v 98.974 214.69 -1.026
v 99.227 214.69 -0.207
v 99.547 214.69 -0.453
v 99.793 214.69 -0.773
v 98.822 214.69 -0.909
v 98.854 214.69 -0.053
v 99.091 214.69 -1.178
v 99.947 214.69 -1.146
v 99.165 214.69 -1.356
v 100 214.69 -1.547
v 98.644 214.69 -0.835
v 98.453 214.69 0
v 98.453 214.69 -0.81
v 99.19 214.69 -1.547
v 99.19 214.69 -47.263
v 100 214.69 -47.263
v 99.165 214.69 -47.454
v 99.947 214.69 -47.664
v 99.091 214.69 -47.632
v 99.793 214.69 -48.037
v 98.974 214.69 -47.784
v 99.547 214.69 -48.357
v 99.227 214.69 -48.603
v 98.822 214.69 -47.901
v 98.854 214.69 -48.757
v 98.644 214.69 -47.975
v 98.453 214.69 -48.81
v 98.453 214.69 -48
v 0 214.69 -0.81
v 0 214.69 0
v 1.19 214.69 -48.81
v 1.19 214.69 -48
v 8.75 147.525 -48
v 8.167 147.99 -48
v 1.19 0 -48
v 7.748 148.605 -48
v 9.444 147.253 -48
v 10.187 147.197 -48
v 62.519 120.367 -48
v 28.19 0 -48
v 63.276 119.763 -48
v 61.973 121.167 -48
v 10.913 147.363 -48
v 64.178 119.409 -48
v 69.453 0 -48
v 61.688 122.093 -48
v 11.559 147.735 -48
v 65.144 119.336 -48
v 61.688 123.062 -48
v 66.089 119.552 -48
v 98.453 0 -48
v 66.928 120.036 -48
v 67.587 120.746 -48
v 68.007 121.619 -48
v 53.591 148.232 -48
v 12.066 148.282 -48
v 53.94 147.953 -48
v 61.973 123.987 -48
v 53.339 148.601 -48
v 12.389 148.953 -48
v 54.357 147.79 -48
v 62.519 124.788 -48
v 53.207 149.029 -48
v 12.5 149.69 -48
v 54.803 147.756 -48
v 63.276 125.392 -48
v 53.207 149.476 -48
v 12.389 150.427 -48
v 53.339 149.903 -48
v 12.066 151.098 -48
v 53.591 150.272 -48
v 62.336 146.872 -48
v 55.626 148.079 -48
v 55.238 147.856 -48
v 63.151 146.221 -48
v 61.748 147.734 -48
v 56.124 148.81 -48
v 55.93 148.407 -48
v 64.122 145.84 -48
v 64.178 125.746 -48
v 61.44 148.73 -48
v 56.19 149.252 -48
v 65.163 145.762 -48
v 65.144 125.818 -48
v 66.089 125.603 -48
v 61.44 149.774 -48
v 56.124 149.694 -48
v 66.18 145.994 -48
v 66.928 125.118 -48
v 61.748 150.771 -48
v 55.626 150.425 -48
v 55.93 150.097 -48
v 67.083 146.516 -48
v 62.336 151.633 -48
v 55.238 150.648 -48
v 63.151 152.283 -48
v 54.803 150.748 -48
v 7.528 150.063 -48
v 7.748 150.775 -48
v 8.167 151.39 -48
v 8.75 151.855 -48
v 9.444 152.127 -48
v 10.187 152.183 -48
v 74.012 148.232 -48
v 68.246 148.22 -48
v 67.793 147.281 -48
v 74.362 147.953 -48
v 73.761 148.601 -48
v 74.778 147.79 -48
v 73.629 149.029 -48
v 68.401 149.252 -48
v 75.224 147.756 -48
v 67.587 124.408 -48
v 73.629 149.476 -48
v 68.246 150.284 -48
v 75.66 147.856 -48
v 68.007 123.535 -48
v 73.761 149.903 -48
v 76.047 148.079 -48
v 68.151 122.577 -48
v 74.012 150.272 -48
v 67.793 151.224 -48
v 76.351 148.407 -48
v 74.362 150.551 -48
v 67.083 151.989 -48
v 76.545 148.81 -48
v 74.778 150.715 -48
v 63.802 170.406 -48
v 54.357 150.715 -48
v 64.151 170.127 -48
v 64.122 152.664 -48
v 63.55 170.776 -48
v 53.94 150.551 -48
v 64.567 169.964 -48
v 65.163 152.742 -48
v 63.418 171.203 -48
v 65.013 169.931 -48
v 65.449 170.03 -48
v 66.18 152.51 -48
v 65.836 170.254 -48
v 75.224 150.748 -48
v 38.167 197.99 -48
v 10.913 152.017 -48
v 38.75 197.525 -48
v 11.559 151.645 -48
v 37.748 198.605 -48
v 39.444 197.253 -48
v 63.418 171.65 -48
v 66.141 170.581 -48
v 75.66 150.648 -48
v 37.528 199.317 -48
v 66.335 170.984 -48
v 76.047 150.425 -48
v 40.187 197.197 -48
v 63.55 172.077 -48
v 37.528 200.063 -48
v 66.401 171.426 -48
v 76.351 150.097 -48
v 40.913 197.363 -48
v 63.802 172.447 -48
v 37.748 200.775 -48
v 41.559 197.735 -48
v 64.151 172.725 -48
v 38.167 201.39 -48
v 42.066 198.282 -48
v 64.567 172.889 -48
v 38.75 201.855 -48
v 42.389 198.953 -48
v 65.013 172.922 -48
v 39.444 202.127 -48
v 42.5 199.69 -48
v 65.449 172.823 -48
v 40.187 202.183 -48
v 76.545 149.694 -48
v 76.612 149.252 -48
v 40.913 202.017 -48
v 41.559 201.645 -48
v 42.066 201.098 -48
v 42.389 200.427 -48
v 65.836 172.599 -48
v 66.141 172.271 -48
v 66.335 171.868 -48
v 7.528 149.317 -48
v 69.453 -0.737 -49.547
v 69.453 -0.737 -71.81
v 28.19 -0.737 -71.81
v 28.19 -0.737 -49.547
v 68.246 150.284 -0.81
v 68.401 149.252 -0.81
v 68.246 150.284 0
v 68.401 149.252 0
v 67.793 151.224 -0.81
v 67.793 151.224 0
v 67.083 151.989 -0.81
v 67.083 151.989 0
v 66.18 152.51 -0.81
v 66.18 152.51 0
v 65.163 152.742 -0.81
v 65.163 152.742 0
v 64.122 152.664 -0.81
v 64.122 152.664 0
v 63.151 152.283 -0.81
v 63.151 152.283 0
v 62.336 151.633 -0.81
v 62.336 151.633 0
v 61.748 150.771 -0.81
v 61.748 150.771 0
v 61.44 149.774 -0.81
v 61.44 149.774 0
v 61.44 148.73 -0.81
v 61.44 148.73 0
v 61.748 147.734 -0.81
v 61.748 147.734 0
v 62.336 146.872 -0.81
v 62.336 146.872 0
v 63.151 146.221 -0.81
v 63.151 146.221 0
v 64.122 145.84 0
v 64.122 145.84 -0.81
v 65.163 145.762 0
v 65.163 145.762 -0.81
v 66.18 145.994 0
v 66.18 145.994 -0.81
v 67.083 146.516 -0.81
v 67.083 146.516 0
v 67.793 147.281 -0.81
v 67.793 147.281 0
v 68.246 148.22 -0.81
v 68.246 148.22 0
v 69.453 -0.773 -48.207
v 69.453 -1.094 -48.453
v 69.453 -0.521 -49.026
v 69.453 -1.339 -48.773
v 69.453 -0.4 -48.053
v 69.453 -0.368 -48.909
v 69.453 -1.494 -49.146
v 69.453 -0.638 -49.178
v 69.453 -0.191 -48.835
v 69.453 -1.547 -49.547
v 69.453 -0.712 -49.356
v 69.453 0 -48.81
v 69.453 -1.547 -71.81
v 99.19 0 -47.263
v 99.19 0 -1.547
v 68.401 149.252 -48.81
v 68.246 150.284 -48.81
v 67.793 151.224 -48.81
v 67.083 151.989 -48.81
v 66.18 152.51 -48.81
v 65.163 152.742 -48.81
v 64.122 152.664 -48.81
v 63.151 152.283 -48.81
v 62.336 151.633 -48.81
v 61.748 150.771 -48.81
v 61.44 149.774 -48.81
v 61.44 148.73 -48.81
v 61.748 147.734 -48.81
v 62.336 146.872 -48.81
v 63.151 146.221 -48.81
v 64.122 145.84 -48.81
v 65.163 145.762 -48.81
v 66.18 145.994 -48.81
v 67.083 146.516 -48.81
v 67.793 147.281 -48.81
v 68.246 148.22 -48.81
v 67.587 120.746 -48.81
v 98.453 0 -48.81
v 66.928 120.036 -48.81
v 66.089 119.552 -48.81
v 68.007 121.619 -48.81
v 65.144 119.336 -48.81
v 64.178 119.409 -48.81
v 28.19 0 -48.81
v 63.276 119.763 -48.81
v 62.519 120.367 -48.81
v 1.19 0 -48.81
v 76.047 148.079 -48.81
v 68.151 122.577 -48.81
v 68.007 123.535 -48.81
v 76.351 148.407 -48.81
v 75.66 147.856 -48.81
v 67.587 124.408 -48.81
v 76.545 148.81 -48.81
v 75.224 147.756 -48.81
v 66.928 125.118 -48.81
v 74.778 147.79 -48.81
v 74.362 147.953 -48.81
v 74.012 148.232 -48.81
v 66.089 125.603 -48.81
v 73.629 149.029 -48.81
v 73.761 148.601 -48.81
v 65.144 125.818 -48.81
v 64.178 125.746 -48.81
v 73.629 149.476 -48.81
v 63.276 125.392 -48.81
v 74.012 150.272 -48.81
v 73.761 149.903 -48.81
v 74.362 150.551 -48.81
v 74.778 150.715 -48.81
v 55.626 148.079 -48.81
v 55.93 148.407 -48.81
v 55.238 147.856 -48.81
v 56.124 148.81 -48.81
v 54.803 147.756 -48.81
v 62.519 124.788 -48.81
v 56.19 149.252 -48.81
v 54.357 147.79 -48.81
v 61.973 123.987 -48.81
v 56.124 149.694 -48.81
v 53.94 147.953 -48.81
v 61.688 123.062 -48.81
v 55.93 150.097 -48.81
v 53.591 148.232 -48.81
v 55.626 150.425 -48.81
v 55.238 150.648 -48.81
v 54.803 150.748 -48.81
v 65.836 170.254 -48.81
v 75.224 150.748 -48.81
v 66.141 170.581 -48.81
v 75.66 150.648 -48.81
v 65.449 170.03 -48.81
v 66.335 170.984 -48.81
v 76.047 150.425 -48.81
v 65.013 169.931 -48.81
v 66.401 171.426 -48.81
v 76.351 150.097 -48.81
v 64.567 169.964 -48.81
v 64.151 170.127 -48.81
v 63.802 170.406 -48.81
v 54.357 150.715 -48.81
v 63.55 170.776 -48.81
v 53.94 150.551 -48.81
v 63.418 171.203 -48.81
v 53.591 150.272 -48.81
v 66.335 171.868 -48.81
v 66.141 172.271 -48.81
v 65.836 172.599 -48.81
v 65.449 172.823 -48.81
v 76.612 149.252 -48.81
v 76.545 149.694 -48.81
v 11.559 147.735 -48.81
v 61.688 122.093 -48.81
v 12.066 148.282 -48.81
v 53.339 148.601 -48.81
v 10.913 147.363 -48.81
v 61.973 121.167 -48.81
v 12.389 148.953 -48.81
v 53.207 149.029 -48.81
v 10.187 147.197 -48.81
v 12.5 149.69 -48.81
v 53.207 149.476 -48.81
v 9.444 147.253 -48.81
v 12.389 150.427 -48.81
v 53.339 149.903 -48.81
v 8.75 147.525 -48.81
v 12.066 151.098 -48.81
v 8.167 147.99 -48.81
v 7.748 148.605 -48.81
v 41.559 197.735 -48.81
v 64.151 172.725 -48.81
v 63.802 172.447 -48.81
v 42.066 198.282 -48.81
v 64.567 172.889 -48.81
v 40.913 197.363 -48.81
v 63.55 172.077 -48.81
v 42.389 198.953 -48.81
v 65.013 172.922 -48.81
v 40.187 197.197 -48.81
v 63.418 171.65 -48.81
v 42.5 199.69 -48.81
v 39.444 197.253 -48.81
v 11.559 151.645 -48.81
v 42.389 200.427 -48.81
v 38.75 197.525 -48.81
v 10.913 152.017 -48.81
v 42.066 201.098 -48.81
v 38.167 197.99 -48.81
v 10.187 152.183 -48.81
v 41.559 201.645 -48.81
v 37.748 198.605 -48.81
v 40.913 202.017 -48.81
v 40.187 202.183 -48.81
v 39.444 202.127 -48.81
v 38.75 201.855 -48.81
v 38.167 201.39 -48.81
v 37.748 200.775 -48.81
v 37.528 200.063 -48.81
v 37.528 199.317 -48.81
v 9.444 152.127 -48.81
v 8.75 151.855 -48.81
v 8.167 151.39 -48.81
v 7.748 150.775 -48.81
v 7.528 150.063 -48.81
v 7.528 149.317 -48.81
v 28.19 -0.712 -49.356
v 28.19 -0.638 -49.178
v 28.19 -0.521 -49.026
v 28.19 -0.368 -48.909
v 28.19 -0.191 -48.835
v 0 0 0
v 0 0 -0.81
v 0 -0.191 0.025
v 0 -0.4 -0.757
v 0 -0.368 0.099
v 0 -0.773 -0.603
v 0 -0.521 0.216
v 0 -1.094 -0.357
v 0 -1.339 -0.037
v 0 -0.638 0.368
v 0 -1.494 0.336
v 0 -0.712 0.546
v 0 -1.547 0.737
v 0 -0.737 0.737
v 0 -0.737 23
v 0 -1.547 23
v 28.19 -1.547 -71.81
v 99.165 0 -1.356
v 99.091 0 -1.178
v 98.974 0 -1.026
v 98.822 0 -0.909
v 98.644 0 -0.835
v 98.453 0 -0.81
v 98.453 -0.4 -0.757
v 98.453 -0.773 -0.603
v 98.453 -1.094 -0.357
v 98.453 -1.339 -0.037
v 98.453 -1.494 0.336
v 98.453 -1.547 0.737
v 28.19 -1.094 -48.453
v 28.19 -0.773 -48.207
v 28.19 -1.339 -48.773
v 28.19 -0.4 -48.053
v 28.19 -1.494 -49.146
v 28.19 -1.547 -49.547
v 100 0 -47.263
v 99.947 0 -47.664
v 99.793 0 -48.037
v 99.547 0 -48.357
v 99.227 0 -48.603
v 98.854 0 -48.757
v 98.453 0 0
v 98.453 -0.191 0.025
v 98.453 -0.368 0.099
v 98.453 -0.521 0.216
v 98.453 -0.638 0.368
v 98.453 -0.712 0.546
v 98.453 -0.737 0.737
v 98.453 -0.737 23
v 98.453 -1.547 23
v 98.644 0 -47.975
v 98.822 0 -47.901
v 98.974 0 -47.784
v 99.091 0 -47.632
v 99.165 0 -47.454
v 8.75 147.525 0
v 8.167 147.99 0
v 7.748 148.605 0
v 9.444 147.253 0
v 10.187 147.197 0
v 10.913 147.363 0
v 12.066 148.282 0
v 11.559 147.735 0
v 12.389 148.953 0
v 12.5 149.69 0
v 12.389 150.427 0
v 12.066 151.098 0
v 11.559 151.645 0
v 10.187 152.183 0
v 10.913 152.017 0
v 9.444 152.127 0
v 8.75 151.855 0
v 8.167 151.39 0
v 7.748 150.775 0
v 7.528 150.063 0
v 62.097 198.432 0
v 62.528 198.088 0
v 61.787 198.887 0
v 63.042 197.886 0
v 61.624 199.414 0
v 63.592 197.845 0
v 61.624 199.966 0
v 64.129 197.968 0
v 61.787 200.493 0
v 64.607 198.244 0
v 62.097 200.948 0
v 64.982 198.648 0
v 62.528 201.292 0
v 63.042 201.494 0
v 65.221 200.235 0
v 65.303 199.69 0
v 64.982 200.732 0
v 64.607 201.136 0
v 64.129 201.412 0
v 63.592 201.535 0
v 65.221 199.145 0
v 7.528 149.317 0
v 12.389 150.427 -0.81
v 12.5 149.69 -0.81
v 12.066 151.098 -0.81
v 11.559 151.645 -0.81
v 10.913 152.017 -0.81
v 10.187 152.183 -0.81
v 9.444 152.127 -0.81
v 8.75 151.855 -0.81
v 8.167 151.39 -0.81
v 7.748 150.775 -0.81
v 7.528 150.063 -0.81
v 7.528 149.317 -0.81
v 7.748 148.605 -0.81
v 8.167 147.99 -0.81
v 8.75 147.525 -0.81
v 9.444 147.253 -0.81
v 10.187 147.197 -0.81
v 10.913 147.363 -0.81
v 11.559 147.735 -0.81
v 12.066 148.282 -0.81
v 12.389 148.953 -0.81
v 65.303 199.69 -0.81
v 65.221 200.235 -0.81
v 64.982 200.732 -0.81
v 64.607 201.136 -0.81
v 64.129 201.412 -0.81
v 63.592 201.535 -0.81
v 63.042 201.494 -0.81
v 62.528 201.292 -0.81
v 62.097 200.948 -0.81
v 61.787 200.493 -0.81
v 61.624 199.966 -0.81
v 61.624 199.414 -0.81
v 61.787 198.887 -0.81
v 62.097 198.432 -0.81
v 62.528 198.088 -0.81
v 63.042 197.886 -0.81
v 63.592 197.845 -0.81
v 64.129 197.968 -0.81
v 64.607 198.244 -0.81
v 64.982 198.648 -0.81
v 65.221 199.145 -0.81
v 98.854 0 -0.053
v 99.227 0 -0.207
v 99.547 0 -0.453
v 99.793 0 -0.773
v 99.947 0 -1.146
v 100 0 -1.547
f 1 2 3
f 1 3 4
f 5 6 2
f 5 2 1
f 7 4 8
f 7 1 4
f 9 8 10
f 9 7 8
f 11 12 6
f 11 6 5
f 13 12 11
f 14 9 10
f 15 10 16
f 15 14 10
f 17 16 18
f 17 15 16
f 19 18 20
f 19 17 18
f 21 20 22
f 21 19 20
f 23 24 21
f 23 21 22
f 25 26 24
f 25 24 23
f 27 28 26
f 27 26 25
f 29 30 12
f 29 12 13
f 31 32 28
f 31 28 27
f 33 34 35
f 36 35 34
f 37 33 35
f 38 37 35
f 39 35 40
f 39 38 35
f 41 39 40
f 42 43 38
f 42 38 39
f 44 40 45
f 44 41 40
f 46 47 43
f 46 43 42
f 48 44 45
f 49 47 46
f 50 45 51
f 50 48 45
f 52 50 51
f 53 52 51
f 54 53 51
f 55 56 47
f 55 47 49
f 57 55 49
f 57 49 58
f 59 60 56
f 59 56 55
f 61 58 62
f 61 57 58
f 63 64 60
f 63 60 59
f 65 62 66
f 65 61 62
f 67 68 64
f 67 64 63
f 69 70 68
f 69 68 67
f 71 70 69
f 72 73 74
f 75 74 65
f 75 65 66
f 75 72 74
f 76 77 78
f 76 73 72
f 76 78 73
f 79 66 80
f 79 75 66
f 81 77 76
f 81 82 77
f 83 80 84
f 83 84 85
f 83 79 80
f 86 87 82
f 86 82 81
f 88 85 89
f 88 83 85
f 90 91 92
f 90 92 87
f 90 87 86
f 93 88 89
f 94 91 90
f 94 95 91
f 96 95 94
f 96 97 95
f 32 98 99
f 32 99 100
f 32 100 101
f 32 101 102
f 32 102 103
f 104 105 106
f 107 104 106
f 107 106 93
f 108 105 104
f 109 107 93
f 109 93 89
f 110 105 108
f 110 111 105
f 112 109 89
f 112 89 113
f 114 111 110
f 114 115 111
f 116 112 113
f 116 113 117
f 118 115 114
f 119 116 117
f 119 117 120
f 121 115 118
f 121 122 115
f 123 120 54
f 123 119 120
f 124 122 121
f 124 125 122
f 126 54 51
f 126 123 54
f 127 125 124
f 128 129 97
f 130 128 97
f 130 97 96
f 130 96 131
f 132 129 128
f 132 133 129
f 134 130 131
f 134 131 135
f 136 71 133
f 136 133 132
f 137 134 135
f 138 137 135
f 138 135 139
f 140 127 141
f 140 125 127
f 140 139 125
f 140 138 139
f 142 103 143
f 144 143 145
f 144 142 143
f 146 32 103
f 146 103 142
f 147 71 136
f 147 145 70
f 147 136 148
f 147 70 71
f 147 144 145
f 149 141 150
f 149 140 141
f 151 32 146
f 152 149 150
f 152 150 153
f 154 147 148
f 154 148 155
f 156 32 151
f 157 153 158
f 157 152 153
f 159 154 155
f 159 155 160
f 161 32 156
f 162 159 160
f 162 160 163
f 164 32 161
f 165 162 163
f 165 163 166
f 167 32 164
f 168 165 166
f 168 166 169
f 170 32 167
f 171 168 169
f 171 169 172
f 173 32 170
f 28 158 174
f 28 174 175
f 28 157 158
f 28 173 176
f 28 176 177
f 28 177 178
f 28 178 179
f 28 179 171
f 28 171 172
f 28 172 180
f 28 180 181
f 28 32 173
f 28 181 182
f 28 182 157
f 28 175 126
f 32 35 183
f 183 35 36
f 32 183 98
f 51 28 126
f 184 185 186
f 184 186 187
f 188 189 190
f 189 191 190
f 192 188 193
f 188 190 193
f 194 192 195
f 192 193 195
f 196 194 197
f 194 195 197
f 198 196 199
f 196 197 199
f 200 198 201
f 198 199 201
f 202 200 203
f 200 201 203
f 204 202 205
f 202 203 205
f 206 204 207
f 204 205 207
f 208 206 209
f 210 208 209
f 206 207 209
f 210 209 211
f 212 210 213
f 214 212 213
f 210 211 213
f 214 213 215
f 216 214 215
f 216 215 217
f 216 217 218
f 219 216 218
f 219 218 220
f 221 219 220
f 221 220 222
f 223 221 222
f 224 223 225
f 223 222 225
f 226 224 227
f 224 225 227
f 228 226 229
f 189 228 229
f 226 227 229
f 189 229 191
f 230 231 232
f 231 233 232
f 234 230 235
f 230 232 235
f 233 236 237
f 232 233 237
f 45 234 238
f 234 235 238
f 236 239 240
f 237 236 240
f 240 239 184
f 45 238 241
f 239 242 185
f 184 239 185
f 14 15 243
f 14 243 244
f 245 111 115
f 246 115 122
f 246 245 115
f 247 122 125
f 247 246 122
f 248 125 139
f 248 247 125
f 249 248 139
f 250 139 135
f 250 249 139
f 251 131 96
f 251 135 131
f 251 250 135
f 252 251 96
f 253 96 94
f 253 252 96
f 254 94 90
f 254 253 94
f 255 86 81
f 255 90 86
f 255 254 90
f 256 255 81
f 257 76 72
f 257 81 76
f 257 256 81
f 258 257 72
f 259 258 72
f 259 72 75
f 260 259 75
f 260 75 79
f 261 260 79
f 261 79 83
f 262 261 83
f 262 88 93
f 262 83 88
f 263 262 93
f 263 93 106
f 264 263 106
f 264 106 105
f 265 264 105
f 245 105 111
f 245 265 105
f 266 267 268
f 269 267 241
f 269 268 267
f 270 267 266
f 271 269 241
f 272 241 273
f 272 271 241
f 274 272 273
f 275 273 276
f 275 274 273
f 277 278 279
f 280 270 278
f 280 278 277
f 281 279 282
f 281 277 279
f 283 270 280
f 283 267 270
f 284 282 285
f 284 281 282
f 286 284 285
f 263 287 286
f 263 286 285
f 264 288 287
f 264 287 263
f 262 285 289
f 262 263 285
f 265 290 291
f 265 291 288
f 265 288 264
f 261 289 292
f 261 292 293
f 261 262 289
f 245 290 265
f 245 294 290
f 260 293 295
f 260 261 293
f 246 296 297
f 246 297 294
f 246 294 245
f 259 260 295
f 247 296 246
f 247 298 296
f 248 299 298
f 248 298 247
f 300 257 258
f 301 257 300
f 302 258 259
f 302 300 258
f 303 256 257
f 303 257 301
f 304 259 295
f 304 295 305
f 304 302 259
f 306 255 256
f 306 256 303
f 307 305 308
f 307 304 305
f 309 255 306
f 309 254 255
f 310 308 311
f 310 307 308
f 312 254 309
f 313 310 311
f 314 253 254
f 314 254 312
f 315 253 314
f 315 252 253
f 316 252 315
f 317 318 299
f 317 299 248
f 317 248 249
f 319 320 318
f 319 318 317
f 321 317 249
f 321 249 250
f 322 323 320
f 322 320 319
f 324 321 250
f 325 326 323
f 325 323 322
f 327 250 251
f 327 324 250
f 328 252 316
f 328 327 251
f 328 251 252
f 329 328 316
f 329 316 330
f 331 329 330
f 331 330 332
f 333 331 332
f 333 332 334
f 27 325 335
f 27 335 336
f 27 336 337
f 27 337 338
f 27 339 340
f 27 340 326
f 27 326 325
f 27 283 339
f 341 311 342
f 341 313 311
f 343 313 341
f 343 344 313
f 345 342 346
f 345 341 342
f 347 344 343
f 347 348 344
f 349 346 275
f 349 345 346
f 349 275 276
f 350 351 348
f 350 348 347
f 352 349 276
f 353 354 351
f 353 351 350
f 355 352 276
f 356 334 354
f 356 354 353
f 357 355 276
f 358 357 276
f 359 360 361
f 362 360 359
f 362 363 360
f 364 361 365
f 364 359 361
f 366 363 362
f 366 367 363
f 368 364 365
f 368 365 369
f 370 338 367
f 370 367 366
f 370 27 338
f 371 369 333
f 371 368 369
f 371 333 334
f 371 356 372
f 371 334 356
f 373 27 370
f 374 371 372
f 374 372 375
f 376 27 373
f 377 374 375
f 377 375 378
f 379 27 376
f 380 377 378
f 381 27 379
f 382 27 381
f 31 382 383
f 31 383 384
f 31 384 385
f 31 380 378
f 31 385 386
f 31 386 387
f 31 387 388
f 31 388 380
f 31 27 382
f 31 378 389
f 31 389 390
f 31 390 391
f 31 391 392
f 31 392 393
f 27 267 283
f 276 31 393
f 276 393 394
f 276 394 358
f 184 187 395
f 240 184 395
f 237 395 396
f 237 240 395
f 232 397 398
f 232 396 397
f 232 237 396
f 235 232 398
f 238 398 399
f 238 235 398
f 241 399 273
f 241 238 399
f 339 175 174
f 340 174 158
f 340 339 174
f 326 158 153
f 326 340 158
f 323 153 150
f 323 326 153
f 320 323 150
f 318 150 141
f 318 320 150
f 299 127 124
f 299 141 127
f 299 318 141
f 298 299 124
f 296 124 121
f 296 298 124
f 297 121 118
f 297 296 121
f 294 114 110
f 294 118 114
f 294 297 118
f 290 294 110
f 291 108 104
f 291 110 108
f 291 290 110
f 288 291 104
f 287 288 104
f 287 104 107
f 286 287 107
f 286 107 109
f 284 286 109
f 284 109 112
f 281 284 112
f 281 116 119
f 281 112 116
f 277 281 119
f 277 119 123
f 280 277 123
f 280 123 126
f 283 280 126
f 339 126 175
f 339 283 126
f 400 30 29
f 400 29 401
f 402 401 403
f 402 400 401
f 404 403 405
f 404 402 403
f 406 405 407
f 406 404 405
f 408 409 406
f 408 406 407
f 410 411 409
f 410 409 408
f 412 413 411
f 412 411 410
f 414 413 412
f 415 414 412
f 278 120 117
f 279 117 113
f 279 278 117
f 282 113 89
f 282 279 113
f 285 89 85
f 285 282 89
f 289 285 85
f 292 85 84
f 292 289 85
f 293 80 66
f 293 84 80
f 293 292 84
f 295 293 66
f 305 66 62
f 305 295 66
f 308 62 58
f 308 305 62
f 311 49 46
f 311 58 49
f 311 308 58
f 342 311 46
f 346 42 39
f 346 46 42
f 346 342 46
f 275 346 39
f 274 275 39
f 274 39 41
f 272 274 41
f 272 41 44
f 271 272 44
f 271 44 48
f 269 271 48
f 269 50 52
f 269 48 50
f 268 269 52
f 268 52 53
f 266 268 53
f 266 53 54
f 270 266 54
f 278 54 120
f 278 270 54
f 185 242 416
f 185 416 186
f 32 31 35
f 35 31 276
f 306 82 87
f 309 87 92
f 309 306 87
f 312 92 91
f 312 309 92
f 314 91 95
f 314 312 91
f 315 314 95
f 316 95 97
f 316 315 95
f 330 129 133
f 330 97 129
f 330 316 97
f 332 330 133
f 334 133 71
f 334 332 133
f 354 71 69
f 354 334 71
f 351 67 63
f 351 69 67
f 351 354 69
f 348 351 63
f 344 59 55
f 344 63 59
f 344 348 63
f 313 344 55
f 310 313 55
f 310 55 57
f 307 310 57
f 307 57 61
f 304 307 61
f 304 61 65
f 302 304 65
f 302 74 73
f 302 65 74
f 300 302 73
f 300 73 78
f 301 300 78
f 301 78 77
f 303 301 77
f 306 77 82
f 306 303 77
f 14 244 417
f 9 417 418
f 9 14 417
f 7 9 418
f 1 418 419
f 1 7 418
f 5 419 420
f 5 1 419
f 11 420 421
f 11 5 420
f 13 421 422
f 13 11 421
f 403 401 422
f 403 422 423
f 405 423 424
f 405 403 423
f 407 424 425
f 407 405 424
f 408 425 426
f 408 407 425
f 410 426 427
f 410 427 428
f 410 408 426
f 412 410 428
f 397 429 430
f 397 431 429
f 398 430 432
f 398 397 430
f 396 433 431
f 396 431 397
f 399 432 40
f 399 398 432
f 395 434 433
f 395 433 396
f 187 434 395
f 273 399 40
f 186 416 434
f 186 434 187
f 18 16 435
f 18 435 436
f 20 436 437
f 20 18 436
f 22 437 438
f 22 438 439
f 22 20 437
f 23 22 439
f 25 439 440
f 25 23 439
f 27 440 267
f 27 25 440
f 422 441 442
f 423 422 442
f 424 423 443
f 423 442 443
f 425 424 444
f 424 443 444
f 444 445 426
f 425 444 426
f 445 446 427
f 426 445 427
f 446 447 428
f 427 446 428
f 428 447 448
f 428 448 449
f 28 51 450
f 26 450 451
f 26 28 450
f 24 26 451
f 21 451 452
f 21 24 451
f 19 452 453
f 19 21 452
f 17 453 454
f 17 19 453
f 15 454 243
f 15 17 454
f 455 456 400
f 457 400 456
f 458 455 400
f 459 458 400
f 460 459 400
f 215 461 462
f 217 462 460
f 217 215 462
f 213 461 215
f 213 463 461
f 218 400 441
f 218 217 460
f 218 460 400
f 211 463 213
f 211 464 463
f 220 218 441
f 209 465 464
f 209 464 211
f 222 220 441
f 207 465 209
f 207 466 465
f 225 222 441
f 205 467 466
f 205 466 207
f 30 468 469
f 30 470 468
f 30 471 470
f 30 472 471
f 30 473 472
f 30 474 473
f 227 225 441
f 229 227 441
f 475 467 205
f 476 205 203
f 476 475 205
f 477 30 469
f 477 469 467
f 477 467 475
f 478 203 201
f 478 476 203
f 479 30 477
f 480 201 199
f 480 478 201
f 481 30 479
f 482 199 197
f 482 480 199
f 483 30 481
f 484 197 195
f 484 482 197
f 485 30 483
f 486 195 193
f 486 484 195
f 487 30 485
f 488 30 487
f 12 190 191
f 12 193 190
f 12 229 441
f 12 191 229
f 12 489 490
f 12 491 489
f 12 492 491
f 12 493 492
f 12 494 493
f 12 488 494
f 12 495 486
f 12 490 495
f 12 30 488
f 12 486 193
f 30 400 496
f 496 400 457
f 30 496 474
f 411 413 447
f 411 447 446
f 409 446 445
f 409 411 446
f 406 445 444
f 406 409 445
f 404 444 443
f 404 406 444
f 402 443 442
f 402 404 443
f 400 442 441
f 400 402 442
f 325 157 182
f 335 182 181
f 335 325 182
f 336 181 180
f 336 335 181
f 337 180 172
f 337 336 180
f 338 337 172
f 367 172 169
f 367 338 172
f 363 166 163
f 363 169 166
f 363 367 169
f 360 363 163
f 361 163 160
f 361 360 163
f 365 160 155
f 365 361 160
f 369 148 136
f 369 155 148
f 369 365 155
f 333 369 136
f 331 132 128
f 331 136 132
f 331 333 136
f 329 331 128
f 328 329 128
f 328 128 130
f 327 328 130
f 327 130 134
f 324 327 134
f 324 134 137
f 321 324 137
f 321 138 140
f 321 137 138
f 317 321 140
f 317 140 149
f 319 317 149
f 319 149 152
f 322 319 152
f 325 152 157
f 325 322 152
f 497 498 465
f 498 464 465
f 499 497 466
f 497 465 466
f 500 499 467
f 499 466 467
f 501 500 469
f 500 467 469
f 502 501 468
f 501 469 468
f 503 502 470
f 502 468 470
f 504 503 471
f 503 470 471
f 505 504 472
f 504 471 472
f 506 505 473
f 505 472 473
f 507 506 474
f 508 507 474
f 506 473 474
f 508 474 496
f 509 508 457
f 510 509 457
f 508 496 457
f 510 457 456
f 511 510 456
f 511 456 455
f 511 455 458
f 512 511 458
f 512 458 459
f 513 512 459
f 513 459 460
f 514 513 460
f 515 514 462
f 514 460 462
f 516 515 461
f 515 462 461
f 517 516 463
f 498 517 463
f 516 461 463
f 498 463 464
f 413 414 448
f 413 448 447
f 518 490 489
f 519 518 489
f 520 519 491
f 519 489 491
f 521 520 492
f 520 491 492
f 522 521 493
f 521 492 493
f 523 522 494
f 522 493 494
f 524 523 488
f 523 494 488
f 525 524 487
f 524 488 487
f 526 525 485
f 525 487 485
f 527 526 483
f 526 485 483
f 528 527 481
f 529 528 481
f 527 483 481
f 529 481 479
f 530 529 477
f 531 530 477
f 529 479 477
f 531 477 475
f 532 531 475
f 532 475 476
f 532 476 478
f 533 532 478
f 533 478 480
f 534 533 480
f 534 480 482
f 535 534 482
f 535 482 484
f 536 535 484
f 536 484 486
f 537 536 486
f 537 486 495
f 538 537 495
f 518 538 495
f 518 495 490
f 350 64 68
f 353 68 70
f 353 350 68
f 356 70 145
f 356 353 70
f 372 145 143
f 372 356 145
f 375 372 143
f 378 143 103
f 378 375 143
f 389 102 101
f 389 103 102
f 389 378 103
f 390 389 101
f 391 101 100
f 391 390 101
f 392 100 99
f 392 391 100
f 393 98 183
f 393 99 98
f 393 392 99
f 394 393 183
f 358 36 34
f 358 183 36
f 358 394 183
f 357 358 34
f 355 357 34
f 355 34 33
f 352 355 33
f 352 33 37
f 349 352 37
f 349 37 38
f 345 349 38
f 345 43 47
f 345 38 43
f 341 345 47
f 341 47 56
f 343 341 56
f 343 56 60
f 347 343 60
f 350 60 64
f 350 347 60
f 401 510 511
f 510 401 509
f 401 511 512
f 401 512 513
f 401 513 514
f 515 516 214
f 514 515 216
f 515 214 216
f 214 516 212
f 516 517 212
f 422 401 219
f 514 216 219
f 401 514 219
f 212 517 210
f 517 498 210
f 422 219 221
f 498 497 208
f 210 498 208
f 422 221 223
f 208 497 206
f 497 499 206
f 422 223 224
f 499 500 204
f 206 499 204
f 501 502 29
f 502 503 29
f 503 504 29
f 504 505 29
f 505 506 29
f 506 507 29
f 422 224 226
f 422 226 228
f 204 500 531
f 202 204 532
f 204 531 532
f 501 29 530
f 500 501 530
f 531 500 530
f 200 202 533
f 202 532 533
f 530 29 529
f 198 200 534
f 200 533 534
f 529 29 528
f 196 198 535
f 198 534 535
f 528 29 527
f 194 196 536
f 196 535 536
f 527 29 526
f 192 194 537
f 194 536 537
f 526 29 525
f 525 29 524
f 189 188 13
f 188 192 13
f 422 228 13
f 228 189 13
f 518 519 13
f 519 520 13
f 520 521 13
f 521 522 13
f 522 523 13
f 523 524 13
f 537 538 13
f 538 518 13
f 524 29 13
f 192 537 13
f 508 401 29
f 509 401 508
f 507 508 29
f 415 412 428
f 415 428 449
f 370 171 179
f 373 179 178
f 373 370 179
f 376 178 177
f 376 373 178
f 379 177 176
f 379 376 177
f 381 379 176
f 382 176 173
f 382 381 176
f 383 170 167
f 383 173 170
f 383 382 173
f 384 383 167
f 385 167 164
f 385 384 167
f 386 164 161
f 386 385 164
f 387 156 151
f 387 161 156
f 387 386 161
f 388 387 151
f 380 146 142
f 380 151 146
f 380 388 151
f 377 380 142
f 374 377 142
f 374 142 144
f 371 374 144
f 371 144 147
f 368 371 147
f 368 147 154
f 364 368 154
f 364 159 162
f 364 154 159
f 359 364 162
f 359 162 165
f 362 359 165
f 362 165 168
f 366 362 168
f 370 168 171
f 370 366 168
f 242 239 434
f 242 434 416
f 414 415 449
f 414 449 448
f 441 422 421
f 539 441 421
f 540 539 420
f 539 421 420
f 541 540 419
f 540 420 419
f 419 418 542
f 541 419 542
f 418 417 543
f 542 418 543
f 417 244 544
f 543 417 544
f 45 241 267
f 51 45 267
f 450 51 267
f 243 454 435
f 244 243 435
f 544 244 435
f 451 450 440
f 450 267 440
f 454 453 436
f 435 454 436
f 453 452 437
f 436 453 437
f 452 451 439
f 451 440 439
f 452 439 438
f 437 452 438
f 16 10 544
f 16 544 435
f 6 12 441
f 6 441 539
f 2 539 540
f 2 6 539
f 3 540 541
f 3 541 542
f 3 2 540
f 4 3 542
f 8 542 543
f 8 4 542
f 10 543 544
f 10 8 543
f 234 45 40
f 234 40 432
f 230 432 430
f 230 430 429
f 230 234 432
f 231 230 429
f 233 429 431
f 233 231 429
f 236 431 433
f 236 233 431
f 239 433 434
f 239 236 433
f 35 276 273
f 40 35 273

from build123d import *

# Parameters (mm, degrees)
SKETCH1_W                    = 100
SKETCH1_H                    = 214.69
BASE_FLANGE1_DEPTH           = 0.81
EDGE_FLANGE1_STRIP_W         = 4.7132
EDGE_FLANGE1_STRIP_H         = 0.81
EDGE_FLANGE1_STRIP_CUT_DEPTH = 214.69
EDGE_FLANGE1_DEPTH           = 214.69
EDGE_FLANGE2_STRIP_W         = 4.7132
EDGE_FLANGE2_STRIP_H         = 0.81
EDGE_FLANGE2_STRIP_CUT_DEPTH = 214.69
EDGE_FLANGE2_DEPTH           = 214.69
EDGE_FLANGE3_DEPTH           = 98.4534
EDGE_FLANGE3_BEND_DEPTH      = 97.2634
SKETCH18_W                   = 29
SKETCH18_H                   = 1.5466
SKETCH18_W_2                 = 27
CUT_EXTRUDE1_DEPTH           = 23.81
CUT_EXTRUDE2_REACH           = 249.484
SKETCH19_R                   = 2.5
SKETCH19_R_2                 = 3.5
SKETCH19_R_3                 = 1.5
SKETCH19_R_4                 = 3.25
CUT_EXTRUDE3_REACH           = 249.484
SKETCH20_R                   = 1.85
SKETCH20_R_2                 = 2.5
SKETCH20_R_3                 = 3.5


# Sheet-metal steps are written as plain solids
with BuildPart() as part:
    # Sketch1 → Base-Flange1 (new body)
    with BuildSketch(Plane.XY):
        with Locations((50, 107.345)):
            Rectangle(SKETCH1_W, SKETCH1_H)
    extrude(amount=-BASE_FLANGE1_DEPTH)

    # Edge-Flange1 strip (across the edge) → Edge-Flange1 strip cut (cut)
    with BuildSketch(Plane(origin=(100, 214.69, -0.81), x_dir=(-1, 0, 0), z_dir=(0, -1, 0))):
        with Locations((-0.81, -0.405)):
            Rectangle(EDGE_FLANGE1_STRIP_W, EDGE_FLANGE1_STRIP_H)
    extrude(amount=EDGE_FLANGE1_STRIP_CUT_DEPTH, mode=Mode.SUBTRACT)

    # Edge-Flange1 section (across the edge) → Edge-Flange1 (add)
    with BuildSketch(Plane(origin=(100, 214.69, -0.81), x_dir=(-1, 0, 0), z_dir=(0, -1, 0))):
        with BuildLine():
            Line((0, 0.7366), (0, 48))
            Line((0, 48), (0.81, 48))
            Line((0.81, 48), (0.81, 0.7366))
            ThreePointArc((0.81, 0.7366), (1.025745145, 0.215745145), (1.5466, 0))
            Line((1.5466, 0), (1.5466, -0.81))
            ThreePointArc((1.5466, -0.81), (0.452988652, -0.357011348), (0, 0.7366))
        make_face()
    extrude(amount=EDGE_FLANGE1_DEPTH)

    # Edge-Flange2 strip (across the edge) → Edge-Flange2 strip cut (cut)
    with BuildSketch(Plane(origin=(99.19, 214.69, -48.81), x_dir=(0, 0, 1), z_dir=(0, -1, 0))):
        with Locations((-0.81, -0.405)):
            Rectangle(EDGE_FLANGE2_STRIP_W, EDGE_FLANGE2_STRIP_H)
    extrude(amount=EDGE_FLANGE2_STRIP_CUT_DEPTH, mode=Mode.SUBTRACT)

    # Edge-Flange2 section (across the edge) → Edge-Flange2 (add)
    with BuildSketch(Plane(origin=(99.19, 214.69, -48.81), x_dir=(0, 0, 1), z_dir=(0, -1, 0))):
        with BuildLine():
            Line((0, 0.7366), (0, 98))
            Line((0, 98), (0.81, 98))
            Line((0.81, 98), (0.81, 0.7366))
            ThreePointArc((0.81, 0.7366), (1.025745145, 0.215745145), (1.5466, 0))
            Line((1.5466, 0), (1.5466, -0.81))
            ThreePointArc((1.5466, -0.81), (0.452988652, -0.357011348), (0, 0.7366))
        make_face()
    extrude(amount=EDGE_FLANGE2_DEPTH)

    # Edge-Flange3 section (across the edge) → Edge-Flange3 (add)
    with BuildSketch(Plane(origin=(0, -0.7366, 0), x_dir=(0, 1, 0), z_dir=(1, 0, 0))):
        with BuildLine():
            Line((-0.81, 0.7366), (-0.81, 23))
            Line((-0.81, 23), (0, 23))
            Line((0, 23), (0, 0.7366))
            ThreePointArc((0, 0.7366), (0.215745145, 0.215745145), (0.7366, 0))
            Line((0.7366, 0), (0.7366, -0.81))
            ThreePointArc((0.7366, -0.81), (-0.357011348, -0.357011348), (-0.81, 0.7366))
        make_face()
    extrude(amount=EDGE_FLANGE3_DEPTH)

    # Edge-Flange3 section 2 (across the edge) → Edge-Flange3 bend (add)
    with BuildSketch(Plane(origin=(98.4534, -0.7366, -48.81), x_dir=(0, 1, 0), z_dir=(-1, 0, 0))):
        with BuildLine():
            Line((-0.81, 0.7366), (-0.81, 23))
            Line((-0.81, 23), (0, 23))
            Line((0, 23), (0, 0.7366))
            ThreePointArc((0, 0.7366), (0.215745145, 0.215745145), (0.7366, 0))
            Line((0.7366, 0), (0.7366, -0.81))
            ThreePointArc((0.7366, -0.81), (-0.357011348, -0.357011348), (-0.81, 0.7366))
        make_face()
    extrude(amount=EDGE_FLANGE3_BEND_DEPTH)

    # Sketch18 → Cut-Extrude1 (cut)
    with BuildSketch(Plane(origin=(0, -57.7366, -71.81), x_dir=(1, 0, 0), z_dir=(0, 0, 1))):
        with Locations((83.9534, 56.9633)):
            Rectangle(SKETCH18_W, SKETCH18_H)
        with Locations((14.69, 56.9633)):
            Rectangle(SKETCH18_W_2, SKETCH18_H)
    extrude(amount=CUT_EXTRUDE1_DEPTH, mode=Mode.SUBTRACT)

    # Sketch19 → Cut-Extrude2 (cut, up to next)
    with BuildSketch(Plane.XY.offset(-48.81), mode=Mode.PRIVATE) as cut_extrude2_sk1:
        with Locations((40, 199.69)):
            Circle(SKETCH19_R)
    cut_extrude2_tool1 = extrude(cut_extrude2_sk1.sketch, amount=CUT_EXTRUDE2_REACH, mode=Mode.PRIVATE) & part.part
    # Sketch19 → Cut-Extrude2 (cut, up to next)
    with BuildSketch(Plane.XY.offset(-48.81), mode=Mode.PRIVATE) as cut_extrude2_sk2:
        with Locations((10, 149.69)):
            Circle(SKETCH19_R)
    cut_extrude2_tool2 = extrude(cut_extrude2_sk2.sketch, amount=CUT_EXTRUDE2_REACH, mode=Mode.PRIVATE) & part.part
    # Sketch19 → Cut-Extrude2 (cut, up to next)
    with BuildSketch(Plane.XY.offset(-48.81), mode=Mode.PRIVATE) as cut_extrude2_sk3:
        with Locations((64.901247632, 149.252126171)):
            Circle(SKETCH19_R_2)
    cut_extrude2_tool3 = extrude(cut_extrude2_sk3.sketch, amount=CUT_EXTRUDE2_REACH, mode=Mode.PRIVATE) & part.part
    # Sketch19 → Cut-Extrude2 (cut, up to next)
    with BuildSketch(Plane.XY.offset(-48.81), mode=Mode.PRIVATE) as cut_extrude2_sk4:
        with Locations((64.901247632, 171.426326171)):
            Circle(SKETCH19_R_3)
    cut_extrude2_tool4 = extrude(cut_extrude2_sk4.sketch, amount=CUT_EXTRUDE2_REACH, mode=Mode.PRIVATE) & part.part
    # Sketch19 → Cut-Extrude2 (cut, up to next)
    with BuildSketch(Plane.XY.offset(-48.81), mode=Mode.PRIVATE) as cut_extrude2_sk5:
        with Locations((75.112047632, 149.252126171)):
            Circle(SKETCH19_R_3)
    cut_extrude2_tool5 = extrude(cut_extrude2_sk5.sketch, amount=CUT_EXTRUDE2_REACH, mode=Mode.PRIVATE) & part.part
    # Sketch19 → Cut-Extrude2 (cut, up to next)
    with BuildSketch(Plane.XY.offset(-48.81), mode=Mode.PRIVATE) as cut_extrude2_sk6:
        with Locations((54.690447632, 149.252126171)):
            Circle(SKETCH19_R_3)
    cut_extrude2_tool6 = extrude(cut_extrude2_sk6.sketch, amount=CUT_EXTRUDE2_REACH, mode=Mode.PRIVATE) & part.part
    # Sketch19 → Cut-Extrude2 (cut, up to next)
    with BuildSketch(Plane.XY.offset(-48.81), mode=Mode.PRIVATE) as cut_extrude2_sk7:
        with Locations((64.901247632, 122.577226171)):
            Circle(SKETCH19_R_4)
    cut_extrude2_tool7 = extrude(cut_extrude2_sk7.sketch, amount=CUT_EXTRUDE2_REACH, mode=Mode.PRIVATE) & part.part
    add(cut_extrude2_tool1.solids().sort_by_distance((40, 199.69, -48.81))[0], mode=Mode.SUBTRACT)
    add(cut_extrude2_tool2.solids().sort_by_distance((10, 149.69, -48.81))[0], mode=Mode.SUBTRACT)
    add(cut_extrude2_tool3.solids().sort_by_distance((64.901248, 149.252126, -48.81))[0], mode=Mode.SUBTRACT)
    add(cut_extrude2_tool4.solids().sort_by_distance((64.901248, 171.426326, -48.81))[0], mode=Mode.SUBTRACT)
    add(cut_extrude2_tool5.solids().sort_by_distance((75.112048, 149.252126, -48.81))[0], mode=Mode.SUBTRACT)
    add(cut_extrude2_tool6.solids().sort_by_distance((54.690448, 149.252126, -48.81))[0], mode=Mode.SUBTRACT)
    add(cut_extrude2_tool7.solids().sort_by_distance((64.901248, 122.577226, -48.81))[0], mode=Mode.SUBTRACT)

    # Sketch20 → Cut-Extrude3 (cut, up to next)
    with BuildSketch(Plane.XY, mode=Mode.PRIVATE) as cut_extrude3_sk1:
        with Locations((63.4534, 199.69)):
            Circle(SKETCH20_R)
    cut_extrude3_tool1 = extrude(cut_extrude3_sk1.sketch, amount=-CUT_EXTRUDE3_REACH, mode=Mode.PRIVATE) & part.part
    # Sketch20 → Cut-Extrude3 (cut, up to next)
    with BuildSketch(Plane.XY, mode=Mode.PRIVATE) as cut_extrude3_sk2:
        with Locations((10, 149.69)):
            Circle(SKETCH20_R_2)
    cut_extrude3_tool2 = extrude(cut_extrude3_sk2.sketch, amount=-CUT_EXTRUDE3_REACH, mode=Mode.PRIVATE) & part.part
    # Sketch20 → Cut-Extrude3 (cut, up to next)
    with BuildSketch(Plane.XY, mode=Mode.PRIVATE) as cut_extrude3_sk3:
        with Locations((64.901247632, 149.252126171)):
            Circle(SKETCH20_R_3)
    cut_extrude3_tool3 = extrude(cut_extrude3_sk3.sketch, amount=-CUT_EXTRUDE3_REACH, mode=Mode.PRIVATE) & part.part
    add(cut_extrude3_tool1.solids().sort_by_distance((63.4534, 199.69, 0))[0], mode=Mode.SUBTRACT)
    add(cut_extrude3_tool2.solids().sort_by_distance((10, 149.69, 0))[0], mode=Mode.SUBTRACT)
    add(cut_extrude3_tool3.solids().sort_by_distance((64.901248, 149.252126, 0))[0], mode=Mode.SUBTRACT)


solid = part.part
